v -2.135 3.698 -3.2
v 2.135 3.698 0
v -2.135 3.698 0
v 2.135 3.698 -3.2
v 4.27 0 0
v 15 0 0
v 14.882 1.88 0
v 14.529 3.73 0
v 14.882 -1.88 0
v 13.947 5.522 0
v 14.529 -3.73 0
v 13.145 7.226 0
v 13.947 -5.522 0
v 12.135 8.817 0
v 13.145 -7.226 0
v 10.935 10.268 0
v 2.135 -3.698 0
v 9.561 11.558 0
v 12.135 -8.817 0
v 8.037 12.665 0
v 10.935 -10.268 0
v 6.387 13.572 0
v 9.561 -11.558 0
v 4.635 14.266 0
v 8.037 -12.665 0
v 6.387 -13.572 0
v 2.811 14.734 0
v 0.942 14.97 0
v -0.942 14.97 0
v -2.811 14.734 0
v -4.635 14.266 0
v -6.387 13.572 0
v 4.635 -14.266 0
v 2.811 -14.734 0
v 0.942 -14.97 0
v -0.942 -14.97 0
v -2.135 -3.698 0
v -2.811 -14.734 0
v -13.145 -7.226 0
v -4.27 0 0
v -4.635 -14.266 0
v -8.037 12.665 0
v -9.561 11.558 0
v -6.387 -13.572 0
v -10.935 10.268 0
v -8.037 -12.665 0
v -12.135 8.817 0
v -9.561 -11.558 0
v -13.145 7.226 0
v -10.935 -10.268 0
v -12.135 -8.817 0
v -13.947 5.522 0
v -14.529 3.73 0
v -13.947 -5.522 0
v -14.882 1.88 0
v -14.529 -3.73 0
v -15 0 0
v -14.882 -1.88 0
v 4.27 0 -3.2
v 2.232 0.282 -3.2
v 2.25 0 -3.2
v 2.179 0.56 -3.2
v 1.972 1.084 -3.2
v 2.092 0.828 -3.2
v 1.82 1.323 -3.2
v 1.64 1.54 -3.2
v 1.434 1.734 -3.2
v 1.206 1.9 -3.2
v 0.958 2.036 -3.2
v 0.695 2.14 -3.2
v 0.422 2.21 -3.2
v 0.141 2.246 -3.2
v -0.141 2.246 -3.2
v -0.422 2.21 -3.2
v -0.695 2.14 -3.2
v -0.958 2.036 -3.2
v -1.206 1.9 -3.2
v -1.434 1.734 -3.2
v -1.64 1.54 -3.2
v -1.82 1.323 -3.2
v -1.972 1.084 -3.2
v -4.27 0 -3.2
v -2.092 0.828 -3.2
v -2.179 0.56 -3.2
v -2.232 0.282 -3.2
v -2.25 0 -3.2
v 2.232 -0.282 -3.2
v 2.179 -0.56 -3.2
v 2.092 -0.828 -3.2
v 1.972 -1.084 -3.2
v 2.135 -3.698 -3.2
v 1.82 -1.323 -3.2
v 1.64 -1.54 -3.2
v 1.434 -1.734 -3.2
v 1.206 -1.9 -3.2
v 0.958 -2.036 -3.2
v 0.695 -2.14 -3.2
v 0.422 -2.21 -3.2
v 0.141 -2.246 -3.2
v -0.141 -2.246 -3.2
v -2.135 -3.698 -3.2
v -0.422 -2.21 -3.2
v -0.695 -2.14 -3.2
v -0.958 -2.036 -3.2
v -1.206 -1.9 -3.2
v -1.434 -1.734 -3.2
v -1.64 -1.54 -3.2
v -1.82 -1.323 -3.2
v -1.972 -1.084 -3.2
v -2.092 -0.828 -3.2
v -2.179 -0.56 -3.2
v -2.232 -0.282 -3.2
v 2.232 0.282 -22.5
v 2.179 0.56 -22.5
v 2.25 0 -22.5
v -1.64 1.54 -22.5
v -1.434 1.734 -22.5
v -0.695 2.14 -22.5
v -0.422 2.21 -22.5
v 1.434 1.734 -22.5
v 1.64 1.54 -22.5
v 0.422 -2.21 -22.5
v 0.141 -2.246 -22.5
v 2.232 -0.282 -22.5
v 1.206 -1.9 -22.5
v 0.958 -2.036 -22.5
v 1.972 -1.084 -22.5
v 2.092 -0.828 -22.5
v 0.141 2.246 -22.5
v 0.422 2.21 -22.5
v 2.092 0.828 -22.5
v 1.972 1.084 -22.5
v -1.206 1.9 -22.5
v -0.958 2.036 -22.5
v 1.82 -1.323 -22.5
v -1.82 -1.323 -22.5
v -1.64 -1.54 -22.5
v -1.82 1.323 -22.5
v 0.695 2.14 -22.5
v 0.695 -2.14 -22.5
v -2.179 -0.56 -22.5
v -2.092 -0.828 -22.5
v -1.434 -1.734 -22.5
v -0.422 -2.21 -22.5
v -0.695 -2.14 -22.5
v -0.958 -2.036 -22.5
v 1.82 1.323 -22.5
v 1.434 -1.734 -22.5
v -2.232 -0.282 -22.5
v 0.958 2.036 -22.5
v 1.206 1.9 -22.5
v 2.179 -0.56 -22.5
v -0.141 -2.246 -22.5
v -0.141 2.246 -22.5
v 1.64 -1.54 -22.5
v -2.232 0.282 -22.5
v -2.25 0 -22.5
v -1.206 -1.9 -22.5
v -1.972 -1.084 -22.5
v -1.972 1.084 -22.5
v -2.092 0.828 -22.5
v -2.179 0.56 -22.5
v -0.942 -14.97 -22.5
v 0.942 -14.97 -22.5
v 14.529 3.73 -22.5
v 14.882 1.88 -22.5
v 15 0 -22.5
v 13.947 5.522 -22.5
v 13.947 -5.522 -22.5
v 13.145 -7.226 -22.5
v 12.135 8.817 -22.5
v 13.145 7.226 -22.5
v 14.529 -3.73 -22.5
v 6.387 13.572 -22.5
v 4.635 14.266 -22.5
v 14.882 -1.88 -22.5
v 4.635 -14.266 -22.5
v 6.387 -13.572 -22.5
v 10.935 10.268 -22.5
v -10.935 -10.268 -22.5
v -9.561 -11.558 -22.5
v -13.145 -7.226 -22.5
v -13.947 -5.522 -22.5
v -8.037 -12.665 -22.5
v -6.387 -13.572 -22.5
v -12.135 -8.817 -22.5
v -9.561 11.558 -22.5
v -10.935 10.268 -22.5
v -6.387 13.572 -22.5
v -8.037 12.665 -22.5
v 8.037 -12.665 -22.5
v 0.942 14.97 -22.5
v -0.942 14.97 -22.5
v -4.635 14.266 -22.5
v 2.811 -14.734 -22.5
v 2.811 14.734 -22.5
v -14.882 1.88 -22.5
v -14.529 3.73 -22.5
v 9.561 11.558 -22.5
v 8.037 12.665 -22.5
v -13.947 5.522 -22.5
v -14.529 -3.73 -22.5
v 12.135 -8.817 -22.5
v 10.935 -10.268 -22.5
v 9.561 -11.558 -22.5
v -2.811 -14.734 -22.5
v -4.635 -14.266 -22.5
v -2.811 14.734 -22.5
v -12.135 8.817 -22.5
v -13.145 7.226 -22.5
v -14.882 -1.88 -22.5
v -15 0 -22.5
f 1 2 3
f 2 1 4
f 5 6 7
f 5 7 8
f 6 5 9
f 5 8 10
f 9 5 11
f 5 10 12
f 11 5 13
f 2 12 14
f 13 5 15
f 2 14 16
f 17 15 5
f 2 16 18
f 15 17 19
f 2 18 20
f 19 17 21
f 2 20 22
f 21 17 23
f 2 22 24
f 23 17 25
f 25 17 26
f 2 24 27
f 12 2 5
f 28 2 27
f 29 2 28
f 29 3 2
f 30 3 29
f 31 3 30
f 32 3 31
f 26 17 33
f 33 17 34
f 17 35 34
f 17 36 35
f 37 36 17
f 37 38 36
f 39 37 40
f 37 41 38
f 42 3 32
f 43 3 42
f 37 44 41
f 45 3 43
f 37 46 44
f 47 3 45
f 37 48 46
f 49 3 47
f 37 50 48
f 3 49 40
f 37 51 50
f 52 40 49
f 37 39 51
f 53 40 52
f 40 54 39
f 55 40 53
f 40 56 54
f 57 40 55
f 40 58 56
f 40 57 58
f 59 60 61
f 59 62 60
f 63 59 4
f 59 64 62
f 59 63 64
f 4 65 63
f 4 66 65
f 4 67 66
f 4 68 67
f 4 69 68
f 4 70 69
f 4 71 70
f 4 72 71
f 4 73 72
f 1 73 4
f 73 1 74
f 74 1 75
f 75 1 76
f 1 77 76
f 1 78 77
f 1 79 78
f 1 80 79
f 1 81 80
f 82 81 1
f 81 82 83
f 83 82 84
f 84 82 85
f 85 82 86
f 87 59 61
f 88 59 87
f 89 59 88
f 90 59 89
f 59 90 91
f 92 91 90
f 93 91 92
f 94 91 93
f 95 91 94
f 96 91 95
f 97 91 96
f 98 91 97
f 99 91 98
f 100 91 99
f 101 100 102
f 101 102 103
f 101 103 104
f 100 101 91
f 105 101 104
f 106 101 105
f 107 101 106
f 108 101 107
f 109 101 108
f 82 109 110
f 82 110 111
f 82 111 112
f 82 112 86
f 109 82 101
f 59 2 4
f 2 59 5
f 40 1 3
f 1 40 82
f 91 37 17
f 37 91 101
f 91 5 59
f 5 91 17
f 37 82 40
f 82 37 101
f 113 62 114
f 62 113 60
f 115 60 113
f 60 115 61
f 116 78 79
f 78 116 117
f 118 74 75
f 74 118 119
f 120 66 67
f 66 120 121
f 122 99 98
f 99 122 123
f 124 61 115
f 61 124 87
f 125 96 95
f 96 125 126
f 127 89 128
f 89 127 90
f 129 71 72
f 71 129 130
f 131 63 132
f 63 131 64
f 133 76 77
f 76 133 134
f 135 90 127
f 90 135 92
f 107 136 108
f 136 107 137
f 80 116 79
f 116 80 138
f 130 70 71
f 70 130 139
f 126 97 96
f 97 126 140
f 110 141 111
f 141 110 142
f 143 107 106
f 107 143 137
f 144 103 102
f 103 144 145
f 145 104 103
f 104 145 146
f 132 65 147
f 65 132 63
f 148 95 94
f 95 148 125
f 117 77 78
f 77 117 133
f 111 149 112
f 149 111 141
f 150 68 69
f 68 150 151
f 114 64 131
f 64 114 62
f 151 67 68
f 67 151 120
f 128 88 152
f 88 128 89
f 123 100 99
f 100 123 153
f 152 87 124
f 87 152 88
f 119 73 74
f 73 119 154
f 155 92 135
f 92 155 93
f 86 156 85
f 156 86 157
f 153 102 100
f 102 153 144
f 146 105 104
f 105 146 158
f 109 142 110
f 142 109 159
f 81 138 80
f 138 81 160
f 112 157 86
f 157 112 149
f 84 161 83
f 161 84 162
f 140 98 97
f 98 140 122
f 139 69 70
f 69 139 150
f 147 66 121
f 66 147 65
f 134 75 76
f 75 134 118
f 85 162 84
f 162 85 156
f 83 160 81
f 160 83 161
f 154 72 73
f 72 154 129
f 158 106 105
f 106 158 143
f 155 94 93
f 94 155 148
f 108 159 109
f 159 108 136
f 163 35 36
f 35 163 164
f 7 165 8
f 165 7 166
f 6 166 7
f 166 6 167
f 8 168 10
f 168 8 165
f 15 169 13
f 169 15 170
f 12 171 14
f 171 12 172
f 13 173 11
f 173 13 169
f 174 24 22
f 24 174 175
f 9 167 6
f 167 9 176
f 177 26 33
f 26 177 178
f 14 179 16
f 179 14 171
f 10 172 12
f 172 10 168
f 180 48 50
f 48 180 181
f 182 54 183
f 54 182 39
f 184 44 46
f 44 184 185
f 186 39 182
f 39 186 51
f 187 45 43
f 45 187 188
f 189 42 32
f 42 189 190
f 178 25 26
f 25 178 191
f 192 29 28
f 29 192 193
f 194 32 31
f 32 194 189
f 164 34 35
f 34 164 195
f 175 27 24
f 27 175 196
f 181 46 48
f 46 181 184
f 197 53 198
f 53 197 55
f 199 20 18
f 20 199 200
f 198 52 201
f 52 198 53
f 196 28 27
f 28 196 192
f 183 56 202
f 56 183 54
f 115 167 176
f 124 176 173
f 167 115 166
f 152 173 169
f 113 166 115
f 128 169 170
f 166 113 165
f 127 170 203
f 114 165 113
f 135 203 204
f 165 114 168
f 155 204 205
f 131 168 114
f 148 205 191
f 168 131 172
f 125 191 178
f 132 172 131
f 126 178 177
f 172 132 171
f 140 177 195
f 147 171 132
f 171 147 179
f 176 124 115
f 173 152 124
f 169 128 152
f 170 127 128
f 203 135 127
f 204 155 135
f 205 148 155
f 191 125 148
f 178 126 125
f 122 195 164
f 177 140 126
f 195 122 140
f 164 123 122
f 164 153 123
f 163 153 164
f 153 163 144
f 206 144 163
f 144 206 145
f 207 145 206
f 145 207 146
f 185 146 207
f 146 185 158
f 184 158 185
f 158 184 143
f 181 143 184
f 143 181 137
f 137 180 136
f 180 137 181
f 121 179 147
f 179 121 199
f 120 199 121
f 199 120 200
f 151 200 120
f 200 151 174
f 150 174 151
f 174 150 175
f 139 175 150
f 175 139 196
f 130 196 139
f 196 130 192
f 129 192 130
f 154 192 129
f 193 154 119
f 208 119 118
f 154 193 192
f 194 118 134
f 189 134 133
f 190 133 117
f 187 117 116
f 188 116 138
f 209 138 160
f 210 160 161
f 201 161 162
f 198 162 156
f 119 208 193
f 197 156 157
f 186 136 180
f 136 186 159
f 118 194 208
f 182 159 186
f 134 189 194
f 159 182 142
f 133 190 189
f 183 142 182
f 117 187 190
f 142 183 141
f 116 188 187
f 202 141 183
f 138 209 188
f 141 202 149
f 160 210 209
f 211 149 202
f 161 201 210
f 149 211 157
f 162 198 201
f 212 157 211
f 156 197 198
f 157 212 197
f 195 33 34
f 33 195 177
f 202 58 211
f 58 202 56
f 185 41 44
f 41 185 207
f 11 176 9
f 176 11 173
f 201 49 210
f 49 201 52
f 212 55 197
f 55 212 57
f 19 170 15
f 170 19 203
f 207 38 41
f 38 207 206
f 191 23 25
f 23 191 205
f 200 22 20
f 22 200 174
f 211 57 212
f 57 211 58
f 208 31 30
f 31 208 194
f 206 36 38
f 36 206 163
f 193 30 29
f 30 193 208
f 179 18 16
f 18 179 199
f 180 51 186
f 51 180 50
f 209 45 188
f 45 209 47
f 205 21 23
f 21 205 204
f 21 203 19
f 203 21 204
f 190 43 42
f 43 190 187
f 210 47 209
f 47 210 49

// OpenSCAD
$fn = 50;


difference() {
	union() {
		translate(v = [0, 0, -22.5000000000]) {
			cylinder(h = 22.5000000000, r = 15.0000000000);
		}
	}
	union() {
		translate(v = [0, 0, 0]) {
			rotate(a = [0, 0, 0]) {
				difference() {
					union() {
						translate(v = [0, 0, -3.2000000000]) {
							linear_extrude(height = 3.2000000000) {
								polygon(points = [[4.2698000000, 0.0000000000], [2.1349000000, 3.6977552691], [-2.1349000000, 3.6977552691], [-4.2698000000, 0.0000000000], [-2.1349000000, -3.6977552691], [2.1349000000, -3.6977552691]]);
							}
						}
					}
					union();
				}
			}
		}
		#translate(v = [0, 0, -100.0000000000]) {
			cylinder(h = 200, r = 2.2500000000);
		}
	}
}
